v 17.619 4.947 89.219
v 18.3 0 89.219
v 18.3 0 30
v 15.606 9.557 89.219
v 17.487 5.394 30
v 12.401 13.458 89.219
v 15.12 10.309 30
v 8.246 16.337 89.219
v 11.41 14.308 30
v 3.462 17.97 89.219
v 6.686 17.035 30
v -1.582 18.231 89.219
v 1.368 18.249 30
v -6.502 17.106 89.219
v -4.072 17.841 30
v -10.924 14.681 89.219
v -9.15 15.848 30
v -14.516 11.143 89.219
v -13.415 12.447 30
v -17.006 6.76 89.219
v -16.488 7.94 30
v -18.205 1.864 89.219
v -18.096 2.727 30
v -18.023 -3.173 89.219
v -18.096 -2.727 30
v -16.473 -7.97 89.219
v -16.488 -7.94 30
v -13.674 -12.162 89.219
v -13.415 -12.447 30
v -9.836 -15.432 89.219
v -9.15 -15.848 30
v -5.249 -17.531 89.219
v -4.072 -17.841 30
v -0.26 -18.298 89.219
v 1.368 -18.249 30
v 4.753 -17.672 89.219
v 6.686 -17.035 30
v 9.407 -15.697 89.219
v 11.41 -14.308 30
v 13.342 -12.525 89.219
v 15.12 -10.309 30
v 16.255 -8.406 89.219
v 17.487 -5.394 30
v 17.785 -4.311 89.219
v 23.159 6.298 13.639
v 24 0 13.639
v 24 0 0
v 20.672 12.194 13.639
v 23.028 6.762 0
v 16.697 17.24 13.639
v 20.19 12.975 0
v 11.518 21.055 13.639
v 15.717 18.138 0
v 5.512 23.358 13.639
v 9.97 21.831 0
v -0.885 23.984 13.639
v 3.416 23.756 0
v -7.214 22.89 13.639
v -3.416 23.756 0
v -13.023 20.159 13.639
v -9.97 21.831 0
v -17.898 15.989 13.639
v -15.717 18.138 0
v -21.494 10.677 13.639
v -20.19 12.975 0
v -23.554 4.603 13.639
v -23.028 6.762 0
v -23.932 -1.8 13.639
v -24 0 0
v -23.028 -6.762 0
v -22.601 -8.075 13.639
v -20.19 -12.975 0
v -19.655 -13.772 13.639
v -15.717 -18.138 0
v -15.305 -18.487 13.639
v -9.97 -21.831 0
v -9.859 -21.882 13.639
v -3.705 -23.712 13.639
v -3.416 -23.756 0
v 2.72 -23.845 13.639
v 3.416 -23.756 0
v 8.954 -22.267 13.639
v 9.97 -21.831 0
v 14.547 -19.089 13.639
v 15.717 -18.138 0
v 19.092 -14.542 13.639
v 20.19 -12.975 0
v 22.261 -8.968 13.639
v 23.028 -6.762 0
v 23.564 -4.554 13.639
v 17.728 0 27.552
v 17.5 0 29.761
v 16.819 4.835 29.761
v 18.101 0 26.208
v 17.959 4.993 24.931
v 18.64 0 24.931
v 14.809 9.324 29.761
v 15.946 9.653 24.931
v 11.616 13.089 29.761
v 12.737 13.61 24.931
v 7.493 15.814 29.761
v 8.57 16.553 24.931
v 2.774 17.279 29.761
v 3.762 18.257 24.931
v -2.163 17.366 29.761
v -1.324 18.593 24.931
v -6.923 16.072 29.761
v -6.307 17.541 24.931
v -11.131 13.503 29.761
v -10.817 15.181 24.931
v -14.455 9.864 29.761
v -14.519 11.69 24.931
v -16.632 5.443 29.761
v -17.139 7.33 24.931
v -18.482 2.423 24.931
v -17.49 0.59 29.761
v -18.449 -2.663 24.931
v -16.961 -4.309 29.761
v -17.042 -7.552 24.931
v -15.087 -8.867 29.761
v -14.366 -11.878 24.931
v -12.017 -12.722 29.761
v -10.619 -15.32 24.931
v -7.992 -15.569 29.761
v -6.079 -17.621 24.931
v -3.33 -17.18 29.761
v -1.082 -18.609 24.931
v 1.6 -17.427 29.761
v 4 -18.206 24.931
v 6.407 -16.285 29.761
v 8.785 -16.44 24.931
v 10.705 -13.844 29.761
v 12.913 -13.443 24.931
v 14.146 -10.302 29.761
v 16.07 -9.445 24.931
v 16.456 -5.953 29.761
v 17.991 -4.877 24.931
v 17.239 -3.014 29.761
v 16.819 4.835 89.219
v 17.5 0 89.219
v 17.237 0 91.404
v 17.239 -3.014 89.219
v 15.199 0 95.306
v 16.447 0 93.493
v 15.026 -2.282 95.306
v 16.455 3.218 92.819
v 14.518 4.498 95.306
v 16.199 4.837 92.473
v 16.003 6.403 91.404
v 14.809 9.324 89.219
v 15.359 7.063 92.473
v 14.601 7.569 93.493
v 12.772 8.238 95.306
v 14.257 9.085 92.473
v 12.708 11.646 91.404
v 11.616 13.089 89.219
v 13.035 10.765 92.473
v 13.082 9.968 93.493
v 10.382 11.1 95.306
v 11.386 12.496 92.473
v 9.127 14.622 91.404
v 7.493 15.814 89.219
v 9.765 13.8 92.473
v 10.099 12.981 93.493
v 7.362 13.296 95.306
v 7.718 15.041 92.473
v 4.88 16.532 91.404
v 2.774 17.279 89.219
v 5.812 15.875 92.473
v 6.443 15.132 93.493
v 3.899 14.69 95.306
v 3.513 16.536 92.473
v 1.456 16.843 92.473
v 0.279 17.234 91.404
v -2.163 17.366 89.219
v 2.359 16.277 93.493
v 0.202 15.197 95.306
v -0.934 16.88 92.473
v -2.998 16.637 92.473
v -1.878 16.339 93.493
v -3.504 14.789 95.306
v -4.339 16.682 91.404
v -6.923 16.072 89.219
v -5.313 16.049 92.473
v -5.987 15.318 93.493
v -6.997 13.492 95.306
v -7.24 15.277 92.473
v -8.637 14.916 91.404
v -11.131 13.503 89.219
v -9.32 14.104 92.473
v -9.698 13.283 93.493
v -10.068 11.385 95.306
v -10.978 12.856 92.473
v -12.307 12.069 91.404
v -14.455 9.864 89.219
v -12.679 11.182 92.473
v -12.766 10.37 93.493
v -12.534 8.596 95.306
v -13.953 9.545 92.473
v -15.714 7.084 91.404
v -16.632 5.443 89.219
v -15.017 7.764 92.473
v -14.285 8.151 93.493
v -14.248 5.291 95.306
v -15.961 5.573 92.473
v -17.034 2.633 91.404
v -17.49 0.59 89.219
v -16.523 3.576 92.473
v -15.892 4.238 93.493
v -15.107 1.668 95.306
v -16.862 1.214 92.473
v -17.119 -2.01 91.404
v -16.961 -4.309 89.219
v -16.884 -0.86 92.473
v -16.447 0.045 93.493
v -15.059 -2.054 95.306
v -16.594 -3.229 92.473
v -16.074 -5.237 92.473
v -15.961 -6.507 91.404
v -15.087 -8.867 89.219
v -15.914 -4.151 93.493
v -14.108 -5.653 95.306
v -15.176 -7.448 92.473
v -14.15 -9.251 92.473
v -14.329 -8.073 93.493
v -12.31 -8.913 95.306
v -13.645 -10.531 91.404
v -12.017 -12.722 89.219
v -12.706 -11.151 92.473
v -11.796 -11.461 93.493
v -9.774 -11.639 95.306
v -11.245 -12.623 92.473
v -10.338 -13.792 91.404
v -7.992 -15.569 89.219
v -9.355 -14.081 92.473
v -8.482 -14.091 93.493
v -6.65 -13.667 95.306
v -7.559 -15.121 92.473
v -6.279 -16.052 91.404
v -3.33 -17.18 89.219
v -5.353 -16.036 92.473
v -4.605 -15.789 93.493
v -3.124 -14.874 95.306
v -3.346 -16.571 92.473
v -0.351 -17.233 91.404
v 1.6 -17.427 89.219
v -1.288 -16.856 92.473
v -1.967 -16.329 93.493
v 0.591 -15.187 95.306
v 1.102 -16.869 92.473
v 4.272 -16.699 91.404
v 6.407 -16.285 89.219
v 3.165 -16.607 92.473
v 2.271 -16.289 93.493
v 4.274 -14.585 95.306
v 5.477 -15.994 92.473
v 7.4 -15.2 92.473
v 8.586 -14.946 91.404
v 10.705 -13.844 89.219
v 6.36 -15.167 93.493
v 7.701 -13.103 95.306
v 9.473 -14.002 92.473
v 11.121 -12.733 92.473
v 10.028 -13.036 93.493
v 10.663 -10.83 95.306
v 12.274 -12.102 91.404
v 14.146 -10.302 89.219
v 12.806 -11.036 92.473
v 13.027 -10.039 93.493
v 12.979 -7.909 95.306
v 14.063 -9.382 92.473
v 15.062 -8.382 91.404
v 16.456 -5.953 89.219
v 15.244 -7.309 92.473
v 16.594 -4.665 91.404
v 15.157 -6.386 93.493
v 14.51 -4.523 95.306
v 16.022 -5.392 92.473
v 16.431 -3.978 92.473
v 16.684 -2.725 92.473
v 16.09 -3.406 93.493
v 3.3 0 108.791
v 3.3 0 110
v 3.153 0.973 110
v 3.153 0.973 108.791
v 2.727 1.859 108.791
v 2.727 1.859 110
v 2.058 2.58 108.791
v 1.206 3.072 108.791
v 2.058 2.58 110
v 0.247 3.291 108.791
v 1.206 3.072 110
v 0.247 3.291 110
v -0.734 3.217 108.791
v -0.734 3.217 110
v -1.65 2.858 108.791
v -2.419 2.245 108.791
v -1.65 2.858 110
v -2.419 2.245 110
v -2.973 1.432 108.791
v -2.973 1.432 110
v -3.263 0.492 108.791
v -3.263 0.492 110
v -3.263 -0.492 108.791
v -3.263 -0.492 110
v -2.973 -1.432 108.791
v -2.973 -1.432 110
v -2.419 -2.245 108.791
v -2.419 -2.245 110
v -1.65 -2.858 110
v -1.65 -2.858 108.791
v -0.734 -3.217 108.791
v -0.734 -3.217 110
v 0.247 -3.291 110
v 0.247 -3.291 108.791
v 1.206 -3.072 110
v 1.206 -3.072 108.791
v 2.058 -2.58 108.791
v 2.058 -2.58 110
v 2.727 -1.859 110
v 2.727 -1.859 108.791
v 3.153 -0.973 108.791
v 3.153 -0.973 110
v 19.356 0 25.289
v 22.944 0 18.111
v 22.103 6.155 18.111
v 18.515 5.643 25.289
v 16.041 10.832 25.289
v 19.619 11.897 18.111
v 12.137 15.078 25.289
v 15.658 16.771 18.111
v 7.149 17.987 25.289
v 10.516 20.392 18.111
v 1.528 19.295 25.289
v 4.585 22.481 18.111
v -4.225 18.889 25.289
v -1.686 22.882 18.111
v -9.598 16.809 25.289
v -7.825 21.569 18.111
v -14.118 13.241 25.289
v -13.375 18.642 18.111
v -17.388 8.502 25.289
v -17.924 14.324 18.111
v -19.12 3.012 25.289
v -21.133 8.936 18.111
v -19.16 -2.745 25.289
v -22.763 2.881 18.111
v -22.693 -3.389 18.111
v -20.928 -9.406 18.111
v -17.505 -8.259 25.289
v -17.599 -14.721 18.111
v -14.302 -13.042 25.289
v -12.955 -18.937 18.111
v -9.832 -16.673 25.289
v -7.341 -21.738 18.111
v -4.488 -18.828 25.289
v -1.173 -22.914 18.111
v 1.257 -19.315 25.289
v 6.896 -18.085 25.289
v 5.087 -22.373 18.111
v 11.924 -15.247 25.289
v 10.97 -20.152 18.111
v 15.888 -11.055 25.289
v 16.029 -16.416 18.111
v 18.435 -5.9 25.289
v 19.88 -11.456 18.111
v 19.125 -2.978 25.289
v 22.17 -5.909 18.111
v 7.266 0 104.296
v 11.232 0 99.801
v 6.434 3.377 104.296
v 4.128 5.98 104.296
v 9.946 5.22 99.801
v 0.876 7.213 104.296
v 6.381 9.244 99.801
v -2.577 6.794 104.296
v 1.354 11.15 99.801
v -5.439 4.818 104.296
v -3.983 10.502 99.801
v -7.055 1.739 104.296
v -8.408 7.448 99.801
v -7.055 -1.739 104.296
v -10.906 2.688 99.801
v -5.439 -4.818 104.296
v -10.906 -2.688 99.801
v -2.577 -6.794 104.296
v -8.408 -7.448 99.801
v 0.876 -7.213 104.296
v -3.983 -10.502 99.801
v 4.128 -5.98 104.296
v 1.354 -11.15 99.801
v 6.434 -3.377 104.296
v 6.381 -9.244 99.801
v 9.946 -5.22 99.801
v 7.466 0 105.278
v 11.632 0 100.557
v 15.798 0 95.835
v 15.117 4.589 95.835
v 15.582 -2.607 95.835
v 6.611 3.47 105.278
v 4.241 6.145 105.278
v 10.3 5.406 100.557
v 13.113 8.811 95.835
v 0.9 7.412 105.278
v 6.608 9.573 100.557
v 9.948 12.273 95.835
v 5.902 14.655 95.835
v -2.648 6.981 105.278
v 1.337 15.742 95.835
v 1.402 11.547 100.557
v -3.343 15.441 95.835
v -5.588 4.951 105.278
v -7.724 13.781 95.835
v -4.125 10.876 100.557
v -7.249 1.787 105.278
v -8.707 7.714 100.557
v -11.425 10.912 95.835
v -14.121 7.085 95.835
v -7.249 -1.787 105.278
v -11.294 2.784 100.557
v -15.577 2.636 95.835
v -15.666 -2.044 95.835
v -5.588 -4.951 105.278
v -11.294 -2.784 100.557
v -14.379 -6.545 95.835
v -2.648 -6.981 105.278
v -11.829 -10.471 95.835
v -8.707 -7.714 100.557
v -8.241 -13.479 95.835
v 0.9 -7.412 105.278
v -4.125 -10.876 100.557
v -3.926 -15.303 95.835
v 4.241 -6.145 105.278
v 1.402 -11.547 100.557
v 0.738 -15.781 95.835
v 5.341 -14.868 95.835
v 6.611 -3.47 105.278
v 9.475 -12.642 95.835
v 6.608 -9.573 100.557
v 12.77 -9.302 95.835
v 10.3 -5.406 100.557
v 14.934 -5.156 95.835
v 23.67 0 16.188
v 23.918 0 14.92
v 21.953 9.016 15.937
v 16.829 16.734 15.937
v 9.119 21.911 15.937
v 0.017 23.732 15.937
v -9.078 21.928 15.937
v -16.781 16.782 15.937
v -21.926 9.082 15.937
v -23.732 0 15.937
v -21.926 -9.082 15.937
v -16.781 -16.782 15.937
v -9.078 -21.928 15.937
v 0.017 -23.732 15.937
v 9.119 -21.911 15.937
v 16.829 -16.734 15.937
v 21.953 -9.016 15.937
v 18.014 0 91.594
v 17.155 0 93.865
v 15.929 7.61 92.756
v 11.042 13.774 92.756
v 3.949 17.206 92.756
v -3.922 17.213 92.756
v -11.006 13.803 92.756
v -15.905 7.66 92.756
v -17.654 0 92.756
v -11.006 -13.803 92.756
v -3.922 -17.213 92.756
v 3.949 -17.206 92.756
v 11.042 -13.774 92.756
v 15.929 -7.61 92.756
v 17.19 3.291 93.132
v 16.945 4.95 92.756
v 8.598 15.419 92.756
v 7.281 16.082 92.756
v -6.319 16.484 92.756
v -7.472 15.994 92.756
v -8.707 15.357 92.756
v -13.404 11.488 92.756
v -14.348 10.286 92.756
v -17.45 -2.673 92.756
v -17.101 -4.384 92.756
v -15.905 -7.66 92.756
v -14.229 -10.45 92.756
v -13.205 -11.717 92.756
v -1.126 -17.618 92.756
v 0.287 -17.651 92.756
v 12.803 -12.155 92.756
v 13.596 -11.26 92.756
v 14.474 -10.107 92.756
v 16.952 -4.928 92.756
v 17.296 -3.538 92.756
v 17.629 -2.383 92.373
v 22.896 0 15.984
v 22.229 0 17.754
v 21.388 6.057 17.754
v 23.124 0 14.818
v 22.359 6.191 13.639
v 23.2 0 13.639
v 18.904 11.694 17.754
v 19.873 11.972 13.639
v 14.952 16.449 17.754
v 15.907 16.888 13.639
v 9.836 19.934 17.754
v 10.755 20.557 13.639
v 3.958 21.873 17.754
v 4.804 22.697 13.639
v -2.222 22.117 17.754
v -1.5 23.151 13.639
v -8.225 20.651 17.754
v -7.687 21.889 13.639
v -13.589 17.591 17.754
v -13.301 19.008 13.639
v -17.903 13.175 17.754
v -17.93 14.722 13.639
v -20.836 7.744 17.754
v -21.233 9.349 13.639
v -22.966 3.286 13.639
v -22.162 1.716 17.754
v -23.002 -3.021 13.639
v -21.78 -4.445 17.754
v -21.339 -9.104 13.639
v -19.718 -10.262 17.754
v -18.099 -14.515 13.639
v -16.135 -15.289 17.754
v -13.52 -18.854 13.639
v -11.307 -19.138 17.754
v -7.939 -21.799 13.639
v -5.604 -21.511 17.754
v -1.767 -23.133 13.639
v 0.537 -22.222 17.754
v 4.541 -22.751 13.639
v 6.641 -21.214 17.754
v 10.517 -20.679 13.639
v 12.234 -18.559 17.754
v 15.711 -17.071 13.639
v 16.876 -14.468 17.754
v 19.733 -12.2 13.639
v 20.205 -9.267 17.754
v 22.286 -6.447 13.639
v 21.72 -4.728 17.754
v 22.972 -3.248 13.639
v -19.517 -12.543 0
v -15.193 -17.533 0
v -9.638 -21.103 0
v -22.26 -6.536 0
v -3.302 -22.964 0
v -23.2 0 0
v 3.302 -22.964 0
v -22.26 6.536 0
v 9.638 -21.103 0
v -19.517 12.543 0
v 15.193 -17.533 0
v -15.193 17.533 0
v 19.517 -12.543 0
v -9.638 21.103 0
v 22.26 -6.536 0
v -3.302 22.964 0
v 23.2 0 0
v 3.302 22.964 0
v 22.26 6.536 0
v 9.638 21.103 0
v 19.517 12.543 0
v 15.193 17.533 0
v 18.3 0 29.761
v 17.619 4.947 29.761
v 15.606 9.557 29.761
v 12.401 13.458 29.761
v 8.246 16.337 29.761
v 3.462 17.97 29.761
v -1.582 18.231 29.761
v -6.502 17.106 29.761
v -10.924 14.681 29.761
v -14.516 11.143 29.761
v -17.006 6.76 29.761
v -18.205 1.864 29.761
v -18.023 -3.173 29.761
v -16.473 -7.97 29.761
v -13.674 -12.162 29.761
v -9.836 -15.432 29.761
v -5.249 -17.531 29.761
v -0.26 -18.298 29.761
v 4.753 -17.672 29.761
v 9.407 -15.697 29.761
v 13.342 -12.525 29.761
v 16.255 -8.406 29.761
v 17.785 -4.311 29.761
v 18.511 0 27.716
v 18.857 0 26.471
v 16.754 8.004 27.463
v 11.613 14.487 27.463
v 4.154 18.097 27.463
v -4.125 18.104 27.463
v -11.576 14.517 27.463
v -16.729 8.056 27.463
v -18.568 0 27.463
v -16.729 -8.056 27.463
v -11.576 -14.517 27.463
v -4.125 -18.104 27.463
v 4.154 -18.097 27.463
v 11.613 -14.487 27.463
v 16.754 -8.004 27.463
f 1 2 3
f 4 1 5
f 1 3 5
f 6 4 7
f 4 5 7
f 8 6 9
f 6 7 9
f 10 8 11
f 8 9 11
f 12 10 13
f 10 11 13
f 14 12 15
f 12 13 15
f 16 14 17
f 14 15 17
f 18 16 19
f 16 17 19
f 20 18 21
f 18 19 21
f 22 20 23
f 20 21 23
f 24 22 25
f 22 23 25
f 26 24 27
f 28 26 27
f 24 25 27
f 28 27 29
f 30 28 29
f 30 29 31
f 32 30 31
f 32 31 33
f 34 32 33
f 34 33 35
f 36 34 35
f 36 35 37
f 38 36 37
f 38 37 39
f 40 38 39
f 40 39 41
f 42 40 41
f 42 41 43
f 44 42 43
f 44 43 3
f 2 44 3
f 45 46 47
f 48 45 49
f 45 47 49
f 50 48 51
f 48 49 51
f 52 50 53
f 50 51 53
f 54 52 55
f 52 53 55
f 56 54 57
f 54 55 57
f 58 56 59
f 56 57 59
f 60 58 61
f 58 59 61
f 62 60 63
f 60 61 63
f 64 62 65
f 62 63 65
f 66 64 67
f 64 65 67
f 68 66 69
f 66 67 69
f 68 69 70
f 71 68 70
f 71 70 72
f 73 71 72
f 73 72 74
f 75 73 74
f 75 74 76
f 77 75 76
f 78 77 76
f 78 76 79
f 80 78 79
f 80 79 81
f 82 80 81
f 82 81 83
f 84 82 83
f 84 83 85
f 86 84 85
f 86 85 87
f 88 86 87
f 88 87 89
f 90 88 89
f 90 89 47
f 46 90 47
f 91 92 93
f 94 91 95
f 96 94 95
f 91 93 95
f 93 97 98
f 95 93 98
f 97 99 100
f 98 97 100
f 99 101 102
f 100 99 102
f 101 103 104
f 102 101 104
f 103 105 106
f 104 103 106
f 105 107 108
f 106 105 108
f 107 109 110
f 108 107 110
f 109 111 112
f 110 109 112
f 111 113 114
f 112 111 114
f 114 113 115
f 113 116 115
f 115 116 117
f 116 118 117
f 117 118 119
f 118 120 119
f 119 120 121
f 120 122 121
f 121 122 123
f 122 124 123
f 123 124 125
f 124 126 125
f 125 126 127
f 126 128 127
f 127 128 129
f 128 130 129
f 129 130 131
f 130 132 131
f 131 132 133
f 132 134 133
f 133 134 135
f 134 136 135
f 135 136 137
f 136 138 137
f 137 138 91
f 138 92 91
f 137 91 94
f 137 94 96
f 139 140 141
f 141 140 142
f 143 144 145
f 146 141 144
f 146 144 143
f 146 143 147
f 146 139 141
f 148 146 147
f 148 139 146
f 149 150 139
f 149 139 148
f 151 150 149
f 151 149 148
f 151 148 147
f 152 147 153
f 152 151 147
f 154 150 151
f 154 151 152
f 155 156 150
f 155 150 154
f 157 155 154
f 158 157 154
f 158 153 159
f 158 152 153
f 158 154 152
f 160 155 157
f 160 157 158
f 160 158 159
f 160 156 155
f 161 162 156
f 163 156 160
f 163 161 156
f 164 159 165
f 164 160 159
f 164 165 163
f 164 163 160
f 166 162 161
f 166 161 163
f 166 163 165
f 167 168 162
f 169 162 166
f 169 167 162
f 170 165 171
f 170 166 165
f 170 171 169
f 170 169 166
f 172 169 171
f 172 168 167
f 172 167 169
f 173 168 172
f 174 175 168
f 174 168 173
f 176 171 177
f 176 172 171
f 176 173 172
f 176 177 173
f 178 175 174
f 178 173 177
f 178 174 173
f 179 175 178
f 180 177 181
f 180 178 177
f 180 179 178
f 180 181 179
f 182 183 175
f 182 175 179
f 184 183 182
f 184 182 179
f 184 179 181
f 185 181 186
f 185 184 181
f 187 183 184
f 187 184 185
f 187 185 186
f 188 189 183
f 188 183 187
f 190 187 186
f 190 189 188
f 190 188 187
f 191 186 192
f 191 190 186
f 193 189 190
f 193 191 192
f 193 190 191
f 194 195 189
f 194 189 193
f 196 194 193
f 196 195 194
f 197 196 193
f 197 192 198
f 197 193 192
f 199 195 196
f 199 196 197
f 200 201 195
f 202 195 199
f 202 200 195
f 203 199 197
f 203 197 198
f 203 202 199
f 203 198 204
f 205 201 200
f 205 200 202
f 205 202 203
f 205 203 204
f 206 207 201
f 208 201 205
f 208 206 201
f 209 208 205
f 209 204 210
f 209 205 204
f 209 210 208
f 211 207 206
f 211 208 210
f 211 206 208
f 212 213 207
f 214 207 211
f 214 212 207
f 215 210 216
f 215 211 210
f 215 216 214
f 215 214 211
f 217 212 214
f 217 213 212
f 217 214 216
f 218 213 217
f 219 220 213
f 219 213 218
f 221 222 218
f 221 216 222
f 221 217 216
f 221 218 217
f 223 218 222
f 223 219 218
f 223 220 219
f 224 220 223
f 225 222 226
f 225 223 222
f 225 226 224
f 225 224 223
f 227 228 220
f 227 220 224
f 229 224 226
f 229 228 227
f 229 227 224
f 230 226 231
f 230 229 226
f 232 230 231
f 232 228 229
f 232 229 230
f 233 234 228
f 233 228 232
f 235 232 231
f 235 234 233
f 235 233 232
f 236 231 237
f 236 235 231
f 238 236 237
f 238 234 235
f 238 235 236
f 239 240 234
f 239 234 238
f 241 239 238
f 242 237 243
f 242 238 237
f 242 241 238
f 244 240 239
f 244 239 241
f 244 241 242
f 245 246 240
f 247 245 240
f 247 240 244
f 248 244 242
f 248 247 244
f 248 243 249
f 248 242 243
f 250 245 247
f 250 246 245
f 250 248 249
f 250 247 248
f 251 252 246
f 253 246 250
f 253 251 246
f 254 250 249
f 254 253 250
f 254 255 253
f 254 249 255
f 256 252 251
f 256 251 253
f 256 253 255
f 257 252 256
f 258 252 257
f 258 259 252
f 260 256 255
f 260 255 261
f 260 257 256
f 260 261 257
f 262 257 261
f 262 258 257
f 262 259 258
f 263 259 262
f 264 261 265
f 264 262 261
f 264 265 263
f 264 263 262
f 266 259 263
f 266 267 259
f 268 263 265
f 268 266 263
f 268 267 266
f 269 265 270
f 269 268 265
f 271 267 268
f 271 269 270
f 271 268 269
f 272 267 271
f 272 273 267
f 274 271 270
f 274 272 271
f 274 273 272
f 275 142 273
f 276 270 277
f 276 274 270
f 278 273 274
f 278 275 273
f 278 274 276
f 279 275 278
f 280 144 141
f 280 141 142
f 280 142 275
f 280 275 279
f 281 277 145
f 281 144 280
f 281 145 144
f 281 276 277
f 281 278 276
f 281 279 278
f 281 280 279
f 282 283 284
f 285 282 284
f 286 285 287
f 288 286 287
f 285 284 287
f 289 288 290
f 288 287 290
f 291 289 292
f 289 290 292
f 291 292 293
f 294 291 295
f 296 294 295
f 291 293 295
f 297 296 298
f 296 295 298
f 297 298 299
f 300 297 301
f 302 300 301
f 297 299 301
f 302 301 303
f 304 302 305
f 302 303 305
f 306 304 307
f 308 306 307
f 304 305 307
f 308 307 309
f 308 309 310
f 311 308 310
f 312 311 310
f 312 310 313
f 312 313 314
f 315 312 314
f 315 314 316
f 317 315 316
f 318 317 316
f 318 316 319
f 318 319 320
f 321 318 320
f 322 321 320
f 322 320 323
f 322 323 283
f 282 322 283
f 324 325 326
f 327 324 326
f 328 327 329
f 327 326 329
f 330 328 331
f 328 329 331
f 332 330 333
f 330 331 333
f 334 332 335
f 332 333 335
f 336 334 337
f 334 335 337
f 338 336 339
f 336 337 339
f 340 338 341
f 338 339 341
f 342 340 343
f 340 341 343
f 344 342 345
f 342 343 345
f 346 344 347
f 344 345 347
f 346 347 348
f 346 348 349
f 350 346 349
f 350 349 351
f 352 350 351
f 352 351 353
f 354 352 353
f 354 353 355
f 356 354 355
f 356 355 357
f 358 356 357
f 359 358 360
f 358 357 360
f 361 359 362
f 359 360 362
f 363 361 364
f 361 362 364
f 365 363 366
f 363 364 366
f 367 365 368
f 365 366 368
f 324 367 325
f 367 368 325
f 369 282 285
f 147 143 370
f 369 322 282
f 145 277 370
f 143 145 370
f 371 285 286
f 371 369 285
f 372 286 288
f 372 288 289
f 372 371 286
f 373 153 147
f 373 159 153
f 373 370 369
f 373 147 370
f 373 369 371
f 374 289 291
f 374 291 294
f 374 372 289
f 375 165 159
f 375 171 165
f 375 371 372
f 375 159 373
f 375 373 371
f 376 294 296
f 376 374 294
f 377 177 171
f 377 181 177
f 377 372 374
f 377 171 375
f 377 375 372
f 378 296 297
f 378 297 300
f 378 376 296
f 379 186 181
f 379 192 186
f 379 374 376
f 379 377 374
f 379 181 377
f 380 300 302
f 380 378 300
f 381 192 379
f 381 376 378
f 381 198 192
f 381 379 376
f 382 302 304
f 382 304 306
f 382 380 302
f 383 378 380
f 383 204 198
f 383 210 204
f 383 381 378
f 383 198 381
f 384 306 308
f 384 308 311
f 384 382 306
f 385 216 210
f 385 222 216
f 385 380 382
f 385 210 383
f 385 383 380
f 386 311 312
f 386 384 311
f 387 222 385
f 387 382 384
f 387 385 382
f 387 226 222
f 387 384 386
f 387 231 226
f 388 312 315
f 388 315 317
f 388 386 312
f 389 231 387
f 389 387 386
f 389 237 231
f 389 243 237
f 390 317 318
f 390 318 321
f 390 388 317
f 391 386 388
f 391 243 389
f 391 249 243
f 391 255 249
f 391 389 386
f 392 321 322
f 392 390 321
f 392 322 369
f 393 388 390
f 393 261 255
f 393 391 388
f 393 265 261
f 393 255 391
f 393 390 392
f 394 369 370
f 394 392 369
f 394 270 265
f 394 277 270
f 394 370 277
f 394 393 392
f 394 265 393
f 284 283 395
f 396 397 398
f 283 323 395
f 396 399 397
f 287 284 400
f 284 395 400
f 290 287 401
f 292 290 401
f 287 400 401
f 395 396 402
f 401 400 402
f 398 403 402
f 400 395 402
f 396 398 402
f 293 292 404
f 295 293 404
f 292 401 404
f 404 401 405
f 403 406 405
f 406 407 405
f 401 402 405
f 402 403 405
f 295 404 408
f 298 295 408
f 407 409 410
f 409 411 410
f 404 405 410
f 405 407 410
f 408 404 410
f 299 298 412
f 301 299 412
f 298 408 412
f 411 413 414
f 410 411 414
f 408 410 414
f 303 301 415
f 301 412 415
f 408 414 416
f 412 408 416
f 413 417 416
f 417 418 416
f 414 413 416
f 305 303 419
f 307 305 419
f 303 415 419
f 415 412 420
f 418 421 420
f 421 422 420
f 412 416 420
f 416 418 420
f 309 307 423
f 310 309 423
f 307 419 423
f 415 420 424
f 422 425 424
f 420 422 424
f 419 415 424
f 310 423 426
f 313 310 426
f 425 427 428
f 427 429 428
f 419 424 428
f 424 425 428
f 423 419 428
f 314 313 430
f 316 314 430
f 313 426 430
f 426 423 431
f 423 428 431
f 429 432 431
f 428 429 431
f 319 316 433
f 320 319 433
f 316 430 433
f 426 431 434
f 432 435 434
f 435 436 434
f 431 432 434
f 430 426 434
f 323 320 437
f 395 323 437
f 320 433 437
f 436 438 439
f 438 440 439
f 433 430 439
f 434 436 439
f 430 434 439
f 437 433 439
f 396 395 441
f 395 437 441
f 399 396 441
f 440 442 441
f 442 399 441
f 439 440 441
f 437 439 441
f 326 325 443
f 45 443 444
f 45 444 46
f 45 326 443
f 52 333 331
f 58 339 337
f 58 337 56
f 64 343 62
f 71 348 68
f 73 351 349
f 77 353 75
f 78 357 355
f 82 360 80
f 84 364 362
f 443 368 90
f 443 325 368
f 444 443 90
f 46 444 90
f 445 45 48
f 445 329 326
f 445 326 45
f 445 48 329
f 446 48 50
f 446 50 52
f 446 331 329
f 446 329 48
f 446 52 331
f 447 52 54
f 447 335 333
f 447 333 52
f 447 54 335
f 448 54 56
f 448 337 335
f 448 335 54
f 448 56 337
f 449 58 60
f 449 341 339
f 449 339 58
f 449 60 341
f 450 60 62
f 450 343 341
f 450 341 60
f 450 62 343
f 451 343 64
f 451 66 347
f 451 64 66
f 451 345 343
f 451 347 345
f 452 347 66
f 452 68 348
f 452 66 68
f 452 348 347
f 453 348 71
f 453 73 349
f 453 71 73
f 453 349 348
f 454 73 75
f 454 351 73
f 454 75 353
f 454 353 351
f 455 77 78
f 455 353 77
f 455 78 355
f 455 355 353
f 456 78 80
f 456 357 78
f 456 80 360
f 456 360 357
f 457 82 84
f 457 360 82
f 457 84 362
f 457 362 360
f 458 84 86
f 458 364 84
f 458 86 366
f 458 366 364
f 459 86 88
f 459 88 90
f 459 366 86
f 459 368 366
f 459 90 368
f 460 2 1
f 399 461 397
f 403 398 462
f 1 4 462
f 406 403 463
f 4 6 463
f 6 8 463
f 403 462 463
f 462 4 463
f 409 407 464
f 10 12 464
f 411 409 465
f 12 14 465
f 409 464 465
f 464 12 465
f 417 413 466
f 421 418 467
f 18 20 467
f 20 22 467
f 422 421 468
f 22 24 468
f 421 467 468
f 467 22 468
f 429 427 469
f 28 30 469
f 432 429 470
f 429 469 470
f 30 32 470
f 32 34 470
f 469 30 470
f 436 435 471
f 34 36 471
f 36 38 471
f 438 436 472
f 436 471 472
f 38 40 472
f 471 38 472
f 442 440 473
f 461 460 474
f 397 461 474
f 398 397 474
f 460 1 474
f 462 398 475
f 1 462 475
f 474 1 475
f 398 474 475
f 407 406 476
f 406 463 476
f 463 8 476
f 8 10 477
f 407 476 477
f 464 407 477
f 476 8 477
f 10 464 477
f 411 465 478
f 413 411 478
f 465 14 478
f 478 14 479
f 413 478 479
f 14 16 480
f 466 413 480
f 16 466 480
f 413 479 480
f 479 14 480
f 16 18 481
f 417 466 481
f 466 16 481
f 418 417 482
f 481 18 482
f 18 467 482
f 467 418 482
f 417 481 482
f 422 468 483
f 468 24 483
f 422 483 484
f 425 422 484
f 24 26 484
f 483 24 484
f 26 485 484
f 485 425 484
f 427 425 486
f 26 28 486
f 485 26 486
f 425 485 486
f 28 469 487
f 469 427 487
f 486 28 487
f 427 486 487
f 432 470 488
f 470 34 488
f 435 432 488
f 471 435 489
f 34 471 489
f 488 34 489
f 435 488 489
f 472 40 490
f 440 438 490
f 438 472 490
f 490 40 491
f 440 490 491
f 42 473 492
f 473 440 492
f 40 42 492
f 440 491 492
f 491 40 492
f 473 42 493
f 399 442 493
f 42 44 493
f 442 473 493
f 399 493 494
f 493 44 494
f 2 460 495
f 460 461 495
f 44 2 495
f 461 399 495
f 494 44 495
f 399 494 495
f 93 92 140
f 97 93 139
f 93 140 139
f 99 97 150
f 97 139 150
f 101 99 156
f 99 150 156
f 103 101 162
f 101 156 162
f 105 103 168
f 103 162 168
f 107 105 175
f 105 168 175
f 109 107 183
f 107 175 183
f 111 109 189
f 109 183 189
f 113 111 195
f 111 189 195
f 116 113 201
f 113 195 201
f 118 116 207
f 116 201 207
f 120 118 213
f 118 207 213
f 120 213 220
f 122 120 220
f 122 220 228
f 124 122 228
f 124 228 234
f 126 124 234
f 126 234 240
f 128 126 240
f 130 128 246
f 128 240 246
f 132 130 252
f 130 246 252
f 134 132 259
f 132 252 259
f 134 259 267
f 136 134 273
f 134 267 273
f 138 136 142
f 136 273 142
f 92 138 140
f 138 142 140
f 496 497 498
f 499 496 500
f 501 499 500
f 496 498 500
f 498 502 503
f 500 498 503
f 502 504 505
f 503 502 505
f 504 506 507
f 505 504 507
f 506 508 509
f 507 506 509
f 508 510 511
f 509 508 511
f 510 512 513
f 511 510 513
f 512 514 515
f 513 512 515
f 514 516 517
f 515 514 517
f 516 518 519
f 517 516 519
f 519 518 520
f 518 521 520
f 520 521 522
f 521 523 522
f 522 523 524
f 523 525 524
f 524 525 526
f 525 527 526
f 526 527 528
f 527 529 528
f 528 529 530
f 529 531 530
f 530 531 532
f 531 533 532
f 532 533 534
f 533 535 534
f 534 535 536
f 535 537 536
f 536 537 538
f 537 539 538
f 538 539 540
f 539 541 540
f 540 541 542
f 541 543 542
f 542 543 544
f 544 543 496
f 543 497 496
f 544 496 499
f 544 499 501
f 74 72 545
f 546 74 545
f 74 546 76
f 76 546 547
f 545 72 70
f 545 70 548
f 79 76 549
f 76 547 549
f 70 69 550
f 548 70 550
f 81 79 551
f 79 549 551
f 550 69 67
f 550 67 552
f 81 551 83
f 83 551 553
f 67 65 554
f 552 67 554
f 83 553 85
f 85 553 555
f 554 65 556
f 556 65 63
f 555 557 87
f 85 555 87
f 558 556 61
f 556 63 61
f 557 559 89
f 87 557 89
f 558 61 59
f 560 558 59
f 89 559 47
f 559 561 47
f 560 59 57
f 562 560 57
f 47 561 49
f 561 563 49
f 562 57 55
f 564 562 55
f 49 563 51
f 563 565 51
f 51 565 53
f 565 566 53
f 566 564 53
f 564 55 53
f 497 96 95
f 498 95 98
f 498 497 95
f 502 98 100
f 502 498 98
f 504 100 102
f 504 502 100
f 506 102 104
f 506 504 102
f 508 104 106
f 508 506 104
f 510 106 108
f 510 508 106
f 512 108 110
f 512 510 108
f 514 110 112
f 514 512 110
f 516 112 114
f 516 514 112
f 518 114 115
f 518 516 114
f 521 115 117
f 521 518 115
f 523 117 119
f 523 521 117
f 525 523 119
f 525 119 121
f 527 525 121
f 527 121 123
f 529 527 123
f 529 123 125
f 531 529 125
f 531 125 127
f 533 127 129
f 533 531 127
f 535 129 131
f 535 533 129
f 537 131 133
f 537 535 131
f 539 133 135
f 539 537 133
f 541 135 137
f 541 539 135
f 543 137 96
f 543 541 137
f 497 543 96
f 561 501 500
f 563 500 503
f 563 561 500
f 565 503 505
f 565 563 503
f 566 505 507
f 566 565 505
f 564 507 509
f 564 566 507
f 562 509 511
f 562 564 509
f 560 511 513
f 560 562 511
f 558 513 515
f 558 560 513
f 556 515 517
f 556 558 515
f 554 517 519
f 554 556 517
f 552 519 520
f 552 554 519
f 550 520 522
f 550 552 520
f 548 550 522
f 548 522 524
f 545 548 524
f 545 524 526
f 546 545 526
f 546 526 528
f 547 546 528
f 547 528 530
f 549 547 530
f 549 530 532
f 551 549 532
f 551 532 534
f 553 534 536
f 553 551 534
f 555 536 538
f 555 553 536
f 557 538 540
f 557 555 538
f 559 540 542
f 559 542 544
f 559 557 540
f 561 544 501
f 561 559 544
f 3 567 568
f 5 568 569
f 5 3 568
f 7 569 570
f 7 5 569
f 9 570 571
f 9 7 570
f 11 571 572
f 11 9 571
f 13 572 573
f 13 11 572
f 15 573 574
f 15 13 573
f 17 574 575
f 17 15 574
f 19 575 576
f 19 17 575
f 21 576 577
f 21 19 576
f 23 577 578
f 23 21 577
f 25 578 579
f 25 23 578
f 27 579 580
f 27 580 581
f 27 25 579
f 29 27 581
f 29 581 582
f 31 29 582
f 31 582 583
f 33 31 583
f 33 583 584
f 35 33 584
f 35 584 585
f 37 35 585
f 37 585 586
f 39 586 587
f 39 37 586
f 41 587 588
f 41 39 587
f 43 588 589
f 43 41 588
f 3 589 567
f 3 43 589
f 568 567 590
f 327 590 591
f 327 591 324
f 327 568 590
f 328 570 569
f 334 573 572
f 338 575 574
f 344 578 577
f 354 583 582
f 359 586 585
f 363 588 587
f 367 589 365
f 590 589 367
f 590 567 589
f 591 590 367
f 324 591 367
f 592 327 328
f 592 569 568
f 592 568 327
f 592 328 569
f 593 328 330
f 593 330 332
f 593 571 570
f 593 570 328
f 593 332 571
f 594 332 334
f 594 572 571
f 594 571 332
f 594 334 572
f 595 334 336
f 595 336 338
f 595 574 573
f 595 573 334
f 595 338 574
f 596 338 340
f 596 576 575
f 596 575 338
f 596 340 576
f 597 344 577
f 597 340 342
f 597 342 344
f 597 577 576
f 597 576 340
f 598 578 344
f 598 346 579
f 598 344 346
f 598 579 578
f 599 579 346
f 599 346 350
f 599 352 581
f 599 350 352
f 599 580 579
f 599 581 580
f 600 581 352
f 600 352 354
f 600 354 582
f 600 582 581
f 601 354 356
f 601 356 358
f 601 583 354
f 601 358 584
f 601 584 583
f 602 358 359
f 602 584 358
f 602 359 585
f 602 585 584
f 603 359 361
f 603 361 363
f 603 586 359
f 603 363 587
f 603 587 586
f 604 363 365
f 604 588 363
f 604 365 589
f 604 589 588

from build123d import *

# Parameters (mm, degrees)
F0_R        = 18.3
F1_DEPTH    = 110
F0_R_2      = 24
F0_R_3      = 19.5
F2_DEPTH    = 30
F3_S5_R     = 18.3
F3_T6_DEPTH = 36
F4_SIZE2    = 17
F4_SIZE     = 15
F5_R        = 10
F6_T        = -0.8
F7_DEPTH    = 25


# Not quite as in the source:
# - a fillet or chamfer that OpenCascade refuses, or shapes differently, is made with other operations: its cross-section is extruded or revolved along the edge and cut away or added


with BuildPart() as f1:
    # F0 (on Top) → F1 (new body)
    with BuildSketch(Plane.XY):
        Circle(F0_R)
    extrude(amount=F1_DEPTH)

    # F0 (on Top) → F2 (join)
    with BuildSketch(Plane.XY):
        Circle(F0_R_2)
        Circle(F0_R_3, mode=Mode.SUBTRACT)
        Circle(F0_R_3)
        Circle(F0_R, mode=Mode.SUBTRACT)
    extrude(amount=F2_DEPTH)

    # F3: chamfer of 7 x 14 on 1 edges, made by hand


with BuildPart() as f3_tool2:
    # F3_s3 → F3_t4 (revolve)
    with BuildSketch(Plane.XZ):
        Polygon((17, 30), (24, 16), (24, 30), align=None)
    revolve(axis=Axis((0, 0, 30), (0, 0, 1)))

    # F3_s5 → F3_t6 (cut, symmetric)
    with BuildSketch(Plane.XY.offset(23)):
        Circle(F3_S5_R)
    extrude(amount=F3_T6_DEPTH, both=True, mode=Mode.SUBTRACT)


with BuildPart() as f1_1:
    add(f1.part)

    # F3_t1: cut F3_tool2
    add(f3_tool2.part, mode=Mode.SUBTRACT)

    # F4
    f4_edges = [f1_1.edges().sort_by_distance(p)[0] for p in [
        (-18.3, 0, 110),
    ]]
    f4_side = f1_1.faces().sort_by_distance((0, 0, 110))[0]
    chamfer(f4_edges, length=F4_SIZE, length2=F4_SIZE2, reference=f4_side)

    # F5
    f5_edges = [f1_1.edges().sort_by_distance(p)[0] for p in [
        (-18.3, 0, 93),
        (-18.3, 0, 30),
        (-18.3, 0, 27.4),
        (-24, 0, 16),
    ]]
    fillet(f5_edges, radius=F5_R)

    # F6
    f6_openings = [f1_1.faces().sort_by_distance(p)[0] for p in [
        (0, 0, 0),
    ]]
    offset(amount=F6_T, openings=f6_openings)

    # F7 (cut): a face of the model
    f7_faces = [f1_1.faces().sort_by_distance(p)[0] for p in [
        (0, 0, 110),
    ]]
    extrude(f7_faces, amount=-F7_DEPTH, mode=Mode.SUBTRACT)


solid = f1_1.part
